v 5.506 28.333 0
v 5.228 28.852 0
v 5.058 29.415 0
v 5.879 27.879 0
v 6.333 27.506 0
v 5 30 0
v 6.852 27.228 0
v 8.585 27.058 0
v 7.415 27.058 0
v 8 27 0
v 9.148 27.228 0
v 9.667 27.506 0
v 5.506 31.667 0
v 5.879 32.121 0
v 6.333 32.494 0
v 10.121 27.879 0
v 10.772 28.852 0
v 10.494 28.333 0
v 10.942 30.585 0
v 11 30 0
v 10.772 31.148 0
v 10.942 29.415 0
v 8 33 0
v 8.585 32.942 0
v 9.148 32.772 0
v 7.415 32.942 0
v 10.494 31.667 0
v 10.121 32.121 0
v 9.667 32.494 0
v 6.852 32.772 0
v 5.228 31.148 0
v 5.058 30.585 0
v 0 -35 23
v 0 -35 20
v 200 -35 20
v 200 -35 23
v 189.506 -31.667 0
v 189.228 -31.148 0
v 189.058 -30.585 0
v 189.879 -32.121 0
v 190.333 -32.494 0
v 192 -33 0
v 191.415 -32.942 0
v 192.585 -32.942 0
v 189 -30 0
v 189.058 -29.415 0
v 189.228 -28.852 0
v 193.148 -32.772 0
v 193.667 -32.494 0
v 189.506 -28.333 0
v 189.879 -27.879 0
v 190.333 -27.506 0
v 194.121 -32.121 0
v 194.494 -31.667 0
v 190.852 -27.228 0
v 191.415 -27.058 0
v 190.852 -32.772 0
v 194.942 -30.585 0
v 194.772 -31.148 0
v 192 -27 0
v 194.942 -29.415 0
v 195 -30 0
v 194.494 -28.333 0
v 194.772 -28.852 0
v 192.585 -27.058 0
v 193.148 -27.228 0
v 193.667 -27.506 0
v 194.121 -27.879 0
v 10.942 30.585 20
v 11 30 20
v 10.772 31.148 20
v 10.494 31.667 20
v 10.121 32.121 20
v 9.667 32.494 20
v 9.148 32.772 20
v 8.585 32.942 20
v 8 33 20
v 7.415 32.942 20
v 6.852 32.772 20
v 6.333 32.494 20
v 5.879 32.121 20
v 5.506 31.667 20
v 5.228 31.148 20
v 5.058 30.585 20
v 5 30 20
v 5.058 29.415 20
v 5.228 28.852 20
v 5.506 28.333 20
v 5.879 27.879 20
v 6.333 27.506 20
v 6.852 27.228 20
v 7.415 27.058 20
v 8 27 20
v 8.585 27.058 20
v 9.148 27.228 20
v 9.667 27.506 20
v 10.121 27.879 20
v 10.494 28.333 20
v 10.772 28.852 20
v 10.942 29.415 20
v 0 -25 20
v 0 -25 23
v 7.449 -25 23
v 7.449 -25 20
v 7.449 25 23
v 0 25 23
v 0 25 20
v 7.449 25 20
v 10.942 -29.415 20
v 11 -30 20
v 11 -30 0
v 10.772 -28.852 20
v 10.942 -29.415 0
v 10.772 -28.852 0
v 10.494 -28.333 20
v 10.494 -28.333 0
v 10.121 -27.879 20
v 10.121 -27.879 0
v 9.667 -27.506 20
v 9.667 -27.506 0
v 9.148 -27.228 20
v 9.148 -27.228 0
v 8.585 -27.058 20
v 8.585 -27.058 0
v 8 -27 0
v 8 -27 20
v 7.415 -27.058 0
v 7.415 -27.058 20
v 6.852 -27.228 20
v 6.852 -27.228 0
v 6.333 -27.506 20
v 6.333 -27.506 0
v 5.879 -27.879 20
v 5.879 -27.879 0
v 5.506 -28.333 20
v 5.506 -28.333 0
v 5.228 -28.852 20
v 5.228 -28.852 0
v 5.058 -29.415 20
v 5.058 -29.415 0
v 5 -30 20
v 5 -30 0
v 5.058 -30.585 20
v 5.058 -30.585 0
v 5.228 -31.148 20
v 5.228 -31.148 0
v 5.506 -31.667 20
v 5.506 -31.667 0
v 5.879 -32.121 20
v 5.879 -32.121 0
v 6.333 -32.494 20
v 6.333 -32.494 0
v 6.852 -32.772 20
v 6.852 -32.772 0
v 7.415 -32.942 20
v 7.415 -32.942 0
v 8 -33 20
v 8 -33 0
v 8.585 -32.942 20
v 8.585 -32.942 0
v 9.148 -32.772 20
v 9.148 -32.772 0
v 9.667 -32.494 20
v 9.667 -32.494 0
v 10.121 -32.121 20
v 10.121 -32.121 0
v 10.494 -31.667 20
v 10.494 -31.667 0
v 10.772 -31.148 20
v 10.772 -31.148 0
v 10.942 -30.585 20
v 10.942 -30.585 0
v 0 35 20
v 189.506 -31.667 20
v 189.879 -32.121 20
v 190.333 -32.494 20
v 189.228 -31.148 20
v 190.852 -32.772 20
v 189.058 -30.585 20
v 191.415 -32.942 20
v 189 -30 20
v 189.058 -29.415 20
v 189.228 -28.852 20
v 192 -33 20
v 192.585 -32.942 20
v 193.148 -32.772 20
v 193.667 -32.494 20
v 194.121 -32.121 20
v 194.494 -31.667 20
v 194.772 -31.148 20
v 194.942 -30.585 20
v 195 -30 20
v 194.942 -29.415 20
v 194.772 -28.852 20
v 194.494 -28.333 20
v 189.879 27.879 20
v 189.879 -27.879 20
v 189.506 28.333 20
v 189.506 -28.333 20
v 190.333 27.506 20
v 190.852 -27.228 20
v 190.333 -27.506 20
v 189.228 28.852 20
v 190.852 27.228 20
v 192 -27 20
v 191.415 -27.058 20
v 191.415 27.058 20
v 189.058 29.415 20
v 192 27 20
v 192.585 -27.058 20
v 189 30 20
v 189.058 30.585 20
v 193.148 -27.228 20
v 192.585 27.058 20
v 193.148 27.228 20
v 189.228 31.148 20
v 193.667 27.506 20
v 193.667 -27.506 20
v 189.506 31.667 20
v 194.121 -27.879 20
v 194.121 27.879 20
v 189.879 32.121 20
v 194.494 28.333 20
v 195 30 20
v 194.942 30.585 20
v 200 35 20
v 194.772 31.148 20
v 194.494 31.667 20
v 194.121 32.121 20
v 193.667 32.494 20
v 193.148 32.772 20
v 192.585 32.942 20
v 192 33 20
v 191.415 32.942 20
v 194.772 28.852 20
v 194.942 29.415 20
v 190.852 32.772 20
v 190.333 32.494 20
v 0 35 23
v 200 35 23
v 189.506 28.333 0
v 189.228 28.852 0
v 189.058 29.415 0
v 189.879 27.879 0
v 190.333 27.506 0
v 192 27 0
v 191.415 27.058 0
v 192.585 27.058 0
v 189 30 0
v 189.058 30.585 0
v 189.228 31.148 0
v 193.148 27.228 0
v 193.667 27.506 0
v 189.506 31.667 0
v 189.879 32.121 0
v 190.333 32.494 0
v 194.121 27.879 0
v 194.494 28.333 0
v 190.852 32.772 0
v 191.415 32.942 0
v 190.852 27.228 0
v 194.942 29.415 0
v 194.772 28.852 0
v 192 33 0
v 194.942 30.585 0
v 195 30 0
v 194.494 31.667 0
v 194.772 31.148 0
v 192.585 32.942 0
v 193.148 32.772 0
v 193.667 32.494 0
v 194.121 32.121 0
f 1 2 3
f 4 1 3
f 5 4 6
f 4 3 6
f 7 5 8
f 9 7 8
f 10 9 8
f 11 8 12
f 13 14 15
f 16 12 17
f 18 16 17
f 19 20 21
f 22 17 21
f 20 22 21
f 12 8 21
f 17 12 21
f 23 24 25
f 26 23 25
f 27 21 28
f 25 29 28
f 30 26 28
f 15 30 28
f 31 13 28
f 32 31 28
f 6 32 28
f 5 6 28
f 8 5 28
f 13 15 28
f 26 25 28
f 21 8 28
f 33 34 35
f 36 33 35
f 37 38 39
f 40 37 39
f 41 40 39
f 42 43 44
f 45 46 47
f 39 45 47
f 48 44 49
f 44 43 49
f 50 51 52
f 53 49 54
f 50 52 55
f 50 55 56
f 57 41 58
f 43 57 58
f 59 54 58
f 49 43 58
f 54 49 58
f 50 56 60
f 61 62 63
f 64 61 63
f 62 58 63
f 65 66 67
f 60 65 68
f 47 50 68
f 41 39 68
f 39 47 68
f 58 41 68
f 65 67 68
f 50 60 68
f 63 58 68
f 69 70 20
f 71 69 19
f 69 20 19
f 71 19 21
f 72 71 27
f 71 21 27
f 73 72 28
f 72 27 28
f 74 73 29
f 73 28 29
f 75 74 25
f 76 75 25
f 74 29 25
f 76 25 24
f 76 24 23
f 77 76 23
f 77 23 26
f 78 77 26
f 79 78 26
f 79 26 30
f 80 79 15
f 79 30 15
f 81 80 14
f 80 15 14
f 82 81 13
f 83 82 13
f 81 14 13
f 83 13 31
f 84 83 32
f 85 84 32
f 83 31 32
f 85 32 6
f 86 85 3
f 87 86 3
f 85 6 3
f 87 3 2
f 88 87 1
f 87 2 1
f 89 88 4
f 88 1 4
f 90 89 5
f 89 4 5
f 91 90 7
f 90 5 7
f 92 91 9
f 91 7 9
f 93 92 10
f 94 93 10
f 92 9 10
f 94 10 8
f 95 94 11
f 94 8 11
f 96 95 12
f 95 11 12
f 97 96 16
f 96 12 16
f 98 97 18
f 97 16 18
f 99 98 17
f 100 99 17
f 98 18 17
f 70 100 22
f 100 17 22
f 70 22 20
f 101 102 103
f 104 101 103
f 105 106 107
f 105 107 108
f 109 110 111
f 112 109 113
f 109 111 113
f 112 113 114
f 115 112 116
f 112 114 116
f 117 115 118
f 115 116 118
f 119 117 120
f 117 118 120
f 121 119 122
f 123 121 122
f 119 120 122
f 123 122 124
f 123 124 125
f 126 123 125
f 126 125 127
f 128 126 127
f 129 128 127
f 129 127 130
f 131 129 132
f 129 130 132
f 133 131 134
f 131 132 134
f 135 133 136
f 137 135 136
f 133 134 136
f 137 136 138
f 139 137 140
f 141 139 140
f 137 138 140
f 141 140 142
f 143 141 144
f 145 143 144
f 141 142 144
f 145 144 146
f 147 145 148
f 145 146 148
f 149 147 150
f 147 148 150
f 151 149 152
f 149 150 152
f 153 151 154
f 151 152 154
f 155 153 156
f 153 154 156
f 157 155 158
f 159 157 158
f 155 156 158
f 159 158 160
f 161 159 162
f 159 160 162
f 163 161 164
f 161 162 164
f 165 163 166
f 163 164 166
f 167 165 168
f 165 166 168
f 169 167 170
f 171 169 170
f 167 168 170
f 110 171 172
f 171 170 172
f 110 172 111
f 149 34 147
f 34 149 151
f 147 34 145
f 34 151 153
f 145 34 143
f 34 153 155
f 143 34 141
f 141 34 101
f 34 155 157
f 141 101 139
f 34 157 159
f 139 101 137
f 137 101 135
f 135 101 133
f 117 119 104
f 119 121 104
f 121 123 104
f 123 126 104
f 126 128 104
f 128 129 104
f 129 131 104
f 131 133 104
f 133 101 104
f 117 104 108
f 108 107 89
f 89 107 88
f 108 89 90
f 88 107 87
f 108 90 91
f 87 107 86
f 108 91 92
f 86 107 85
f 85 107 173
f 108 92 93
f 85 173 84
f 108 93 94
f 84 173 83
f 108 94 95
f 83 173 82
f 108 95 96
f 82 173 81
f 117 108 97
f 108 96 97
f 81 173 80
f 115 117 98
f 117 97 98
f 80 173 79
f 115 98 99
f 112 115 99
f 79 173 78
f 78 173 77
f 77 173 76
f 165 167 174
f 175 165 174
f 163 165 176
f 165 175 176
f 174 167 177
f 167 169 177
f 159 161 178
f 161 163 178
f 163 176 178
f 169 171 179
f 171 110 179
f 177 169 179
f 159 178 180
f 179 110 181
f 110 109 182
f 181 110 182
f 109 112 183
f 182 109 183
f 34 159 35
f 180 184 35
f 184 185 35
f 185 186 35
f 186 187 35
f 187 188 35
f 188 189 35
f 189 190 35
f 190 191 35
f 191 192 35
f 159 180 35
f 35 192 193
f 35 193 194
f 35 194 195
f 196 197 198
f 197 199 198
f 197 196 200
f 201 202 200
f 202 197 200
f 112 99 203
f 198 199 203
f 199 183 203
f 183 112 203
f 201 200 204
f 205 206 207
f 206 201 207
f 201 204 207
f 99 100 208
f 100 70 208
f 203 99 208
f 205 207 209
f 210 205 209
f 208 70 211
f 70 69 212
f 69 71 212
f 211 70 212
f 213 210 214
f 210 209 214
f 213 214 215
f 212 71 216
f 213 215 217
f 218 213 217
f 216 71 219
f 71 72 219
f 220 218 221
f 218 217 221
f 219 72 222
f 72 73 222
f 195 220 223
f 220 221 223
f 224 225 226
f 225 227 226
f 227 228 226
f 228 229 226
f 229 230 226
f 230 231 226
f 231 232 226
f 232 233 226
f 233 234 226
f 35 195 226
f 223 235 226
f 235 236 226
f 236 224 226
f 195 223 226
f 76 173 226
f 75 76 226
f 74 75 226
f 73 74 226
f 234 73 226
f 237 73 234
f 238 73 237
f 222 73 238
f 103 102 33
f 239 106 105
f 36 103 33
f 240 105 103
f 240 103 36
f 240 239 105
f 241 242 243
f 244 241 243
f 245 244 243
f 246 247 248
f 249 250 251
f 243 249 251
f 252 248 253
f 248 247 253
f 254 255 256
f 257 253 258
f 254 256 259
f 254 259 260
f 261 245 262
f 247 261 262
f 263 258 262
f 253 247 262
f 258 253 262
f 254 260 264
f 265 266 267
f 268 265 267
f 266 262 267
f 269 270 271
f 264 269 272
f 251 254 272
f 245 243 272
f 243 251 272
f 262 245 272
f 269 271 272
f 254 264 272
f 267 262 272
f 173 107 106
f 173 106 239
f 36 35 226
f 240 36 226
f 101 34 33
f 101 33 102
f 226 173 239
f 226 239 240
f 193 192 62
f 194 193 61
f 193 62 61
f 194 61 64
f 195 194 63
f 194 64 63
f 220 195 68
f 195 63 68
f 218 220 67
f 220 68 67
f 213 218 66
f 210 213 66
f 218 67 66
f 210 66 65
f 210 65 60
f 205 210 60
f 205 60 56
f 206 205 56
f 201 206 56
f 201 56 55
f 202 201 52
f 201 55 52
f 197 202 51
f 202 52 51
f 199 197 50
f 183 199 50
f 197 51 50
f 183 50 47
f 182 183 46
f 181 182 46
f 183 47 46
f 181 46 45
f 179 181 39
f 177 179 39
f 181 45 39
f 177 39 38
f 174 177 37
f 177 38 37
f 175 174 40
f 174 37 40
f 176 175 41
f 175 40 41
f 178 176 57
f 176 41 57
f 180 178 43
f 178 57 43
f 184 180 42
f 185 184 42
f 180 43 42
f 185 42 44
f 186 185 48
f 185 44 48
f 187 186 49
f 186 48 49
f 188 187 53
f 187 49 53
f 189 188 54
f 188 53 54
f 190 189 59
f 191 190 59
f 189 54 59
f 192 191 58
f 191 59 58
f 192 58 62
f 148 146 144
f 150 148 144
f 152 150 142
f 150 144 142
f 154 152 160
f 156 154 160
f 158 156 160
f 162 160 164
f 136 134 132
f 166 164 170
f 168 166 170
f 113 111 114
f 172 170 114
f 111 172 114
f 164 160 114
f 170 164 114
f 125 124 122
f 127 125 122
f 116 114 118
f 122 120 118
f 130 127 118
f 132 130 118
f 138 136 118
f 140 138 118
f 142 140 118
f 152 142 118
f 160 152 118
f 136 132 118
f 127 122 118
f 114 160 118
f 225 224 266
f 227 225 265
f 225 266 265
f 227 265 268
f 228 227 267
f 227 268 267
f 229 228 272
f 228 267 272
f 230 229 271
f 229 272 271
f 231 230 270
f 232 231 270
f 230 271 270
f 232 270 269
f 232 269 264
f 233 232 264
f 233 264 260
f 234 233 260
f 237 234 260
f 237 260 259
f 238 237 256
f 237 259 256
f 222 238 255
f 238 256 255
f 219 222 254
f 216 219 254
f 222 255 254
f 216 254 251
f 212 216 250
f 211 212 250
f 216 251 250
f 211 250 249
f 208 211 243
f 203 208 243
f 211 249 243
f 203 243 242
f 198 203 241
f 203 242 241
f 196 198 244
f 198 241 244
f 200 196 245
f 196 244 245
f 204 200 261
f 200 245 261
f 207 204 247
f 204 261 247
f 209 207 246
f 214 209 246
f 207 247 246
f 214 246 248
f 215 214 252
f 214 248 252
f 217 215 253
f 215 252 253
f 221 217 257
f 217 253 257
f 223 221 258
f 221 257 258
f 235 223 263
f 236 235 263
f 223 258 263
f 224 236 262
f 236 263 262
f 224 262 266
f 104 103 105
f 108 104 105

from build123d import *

# Parameters (mm, degrees)
ESBO_O2_R                  = 3
RESSALTO_EXTRUS_O1_DEPTH   = 20
RESSALTO_EXTRUS_O1_2_DEPTH = 20
RESSALTO_EXTRUS_O1_3_DEPTH = 20
RESSALTO_EXTRUS_O1_4_DEPTH = 20
ESBO_O3_W                  = 200
ESBO_O3_H                  = 70
RESSALTO_EXTRUS_O2_DEPTH   = 3
ESBO_O4_W                  = 14.89887522
ESBO_O4_H                  = 50
CORTE_EXTRUS_O1_DEPTH      = 3


with BuildPart() as part:
    # Esboço2 → Ressalto-extrusão1 (new body)
    with BuildSketch(Plane.XY):
        with Locations((192, -30)):
            Circle(ESBO_O2_R)
    extrude(amount=RESSALTO_EXTRUS_O1_DEPTH)



with BuildPart() as body_2:
    # Esboço2 → Ressalto-extrus_o1 2 (new body)
    with BuildSketch(Plane.XY):
        with Locations((192, 30)):
            Circle(ESBO_O2_R)
    extrude(amount=RESSALTO_EXTRUS_O1_2_DEPTH)


with BuildPart() as body_3:
    # Esboço2 → Ressalto-extrus_o1 3 (new body)
    with BuildSketch(Plane.XY):
        with Locations((8, 30)):
            Circle(ESBO_O2_R)
    extrude(amount=RESSALTO_EXTRUS_O1_3_DEPTH)


with BuildPart() as body_4:
    # Esboço2 → Ressalto-extrus_o1 4 (new body)
    with BuildSketch(Plane.XY):
        with Locations((8, -30)):
            Circle(ESBO_O2_R)
    extrude(amount=RESSALTO_EXTRUS_O1_4_DEPTH)


with BuildPart() as part_1:
    add(part.part)

    add(body_2.part)  # Ressalto-extrusão2 merges body 2

    add(body_3.part)  # Ressalto-extrusão2 merges body 3

    add(body_4.part)  # Ressalto-extrusão2 merges body 4
    # Esboço3 → Ressalto-extrusão2 (add)
    with BuildSketch(Plane.XY.offset(20)):
        with Locations((100, 0)):
            Rectangle(ESBO_O3_W, ESBO_O3_H)
    extrude(amount=RESSALTO_EXTRUS_O2_DEPTH)

    # Esboço4 → Corte-extrusão1 (cut)
    with BuildSketch(Plane.XY.offset(23)):
        Rectangle(ESBO_O4_W, ESBO_O4_H)
    extrude(amount=-CORTE_EXTRUS_O1_DEPTH, mode=Mode.SUBTRACT)


solid = part_1.part
